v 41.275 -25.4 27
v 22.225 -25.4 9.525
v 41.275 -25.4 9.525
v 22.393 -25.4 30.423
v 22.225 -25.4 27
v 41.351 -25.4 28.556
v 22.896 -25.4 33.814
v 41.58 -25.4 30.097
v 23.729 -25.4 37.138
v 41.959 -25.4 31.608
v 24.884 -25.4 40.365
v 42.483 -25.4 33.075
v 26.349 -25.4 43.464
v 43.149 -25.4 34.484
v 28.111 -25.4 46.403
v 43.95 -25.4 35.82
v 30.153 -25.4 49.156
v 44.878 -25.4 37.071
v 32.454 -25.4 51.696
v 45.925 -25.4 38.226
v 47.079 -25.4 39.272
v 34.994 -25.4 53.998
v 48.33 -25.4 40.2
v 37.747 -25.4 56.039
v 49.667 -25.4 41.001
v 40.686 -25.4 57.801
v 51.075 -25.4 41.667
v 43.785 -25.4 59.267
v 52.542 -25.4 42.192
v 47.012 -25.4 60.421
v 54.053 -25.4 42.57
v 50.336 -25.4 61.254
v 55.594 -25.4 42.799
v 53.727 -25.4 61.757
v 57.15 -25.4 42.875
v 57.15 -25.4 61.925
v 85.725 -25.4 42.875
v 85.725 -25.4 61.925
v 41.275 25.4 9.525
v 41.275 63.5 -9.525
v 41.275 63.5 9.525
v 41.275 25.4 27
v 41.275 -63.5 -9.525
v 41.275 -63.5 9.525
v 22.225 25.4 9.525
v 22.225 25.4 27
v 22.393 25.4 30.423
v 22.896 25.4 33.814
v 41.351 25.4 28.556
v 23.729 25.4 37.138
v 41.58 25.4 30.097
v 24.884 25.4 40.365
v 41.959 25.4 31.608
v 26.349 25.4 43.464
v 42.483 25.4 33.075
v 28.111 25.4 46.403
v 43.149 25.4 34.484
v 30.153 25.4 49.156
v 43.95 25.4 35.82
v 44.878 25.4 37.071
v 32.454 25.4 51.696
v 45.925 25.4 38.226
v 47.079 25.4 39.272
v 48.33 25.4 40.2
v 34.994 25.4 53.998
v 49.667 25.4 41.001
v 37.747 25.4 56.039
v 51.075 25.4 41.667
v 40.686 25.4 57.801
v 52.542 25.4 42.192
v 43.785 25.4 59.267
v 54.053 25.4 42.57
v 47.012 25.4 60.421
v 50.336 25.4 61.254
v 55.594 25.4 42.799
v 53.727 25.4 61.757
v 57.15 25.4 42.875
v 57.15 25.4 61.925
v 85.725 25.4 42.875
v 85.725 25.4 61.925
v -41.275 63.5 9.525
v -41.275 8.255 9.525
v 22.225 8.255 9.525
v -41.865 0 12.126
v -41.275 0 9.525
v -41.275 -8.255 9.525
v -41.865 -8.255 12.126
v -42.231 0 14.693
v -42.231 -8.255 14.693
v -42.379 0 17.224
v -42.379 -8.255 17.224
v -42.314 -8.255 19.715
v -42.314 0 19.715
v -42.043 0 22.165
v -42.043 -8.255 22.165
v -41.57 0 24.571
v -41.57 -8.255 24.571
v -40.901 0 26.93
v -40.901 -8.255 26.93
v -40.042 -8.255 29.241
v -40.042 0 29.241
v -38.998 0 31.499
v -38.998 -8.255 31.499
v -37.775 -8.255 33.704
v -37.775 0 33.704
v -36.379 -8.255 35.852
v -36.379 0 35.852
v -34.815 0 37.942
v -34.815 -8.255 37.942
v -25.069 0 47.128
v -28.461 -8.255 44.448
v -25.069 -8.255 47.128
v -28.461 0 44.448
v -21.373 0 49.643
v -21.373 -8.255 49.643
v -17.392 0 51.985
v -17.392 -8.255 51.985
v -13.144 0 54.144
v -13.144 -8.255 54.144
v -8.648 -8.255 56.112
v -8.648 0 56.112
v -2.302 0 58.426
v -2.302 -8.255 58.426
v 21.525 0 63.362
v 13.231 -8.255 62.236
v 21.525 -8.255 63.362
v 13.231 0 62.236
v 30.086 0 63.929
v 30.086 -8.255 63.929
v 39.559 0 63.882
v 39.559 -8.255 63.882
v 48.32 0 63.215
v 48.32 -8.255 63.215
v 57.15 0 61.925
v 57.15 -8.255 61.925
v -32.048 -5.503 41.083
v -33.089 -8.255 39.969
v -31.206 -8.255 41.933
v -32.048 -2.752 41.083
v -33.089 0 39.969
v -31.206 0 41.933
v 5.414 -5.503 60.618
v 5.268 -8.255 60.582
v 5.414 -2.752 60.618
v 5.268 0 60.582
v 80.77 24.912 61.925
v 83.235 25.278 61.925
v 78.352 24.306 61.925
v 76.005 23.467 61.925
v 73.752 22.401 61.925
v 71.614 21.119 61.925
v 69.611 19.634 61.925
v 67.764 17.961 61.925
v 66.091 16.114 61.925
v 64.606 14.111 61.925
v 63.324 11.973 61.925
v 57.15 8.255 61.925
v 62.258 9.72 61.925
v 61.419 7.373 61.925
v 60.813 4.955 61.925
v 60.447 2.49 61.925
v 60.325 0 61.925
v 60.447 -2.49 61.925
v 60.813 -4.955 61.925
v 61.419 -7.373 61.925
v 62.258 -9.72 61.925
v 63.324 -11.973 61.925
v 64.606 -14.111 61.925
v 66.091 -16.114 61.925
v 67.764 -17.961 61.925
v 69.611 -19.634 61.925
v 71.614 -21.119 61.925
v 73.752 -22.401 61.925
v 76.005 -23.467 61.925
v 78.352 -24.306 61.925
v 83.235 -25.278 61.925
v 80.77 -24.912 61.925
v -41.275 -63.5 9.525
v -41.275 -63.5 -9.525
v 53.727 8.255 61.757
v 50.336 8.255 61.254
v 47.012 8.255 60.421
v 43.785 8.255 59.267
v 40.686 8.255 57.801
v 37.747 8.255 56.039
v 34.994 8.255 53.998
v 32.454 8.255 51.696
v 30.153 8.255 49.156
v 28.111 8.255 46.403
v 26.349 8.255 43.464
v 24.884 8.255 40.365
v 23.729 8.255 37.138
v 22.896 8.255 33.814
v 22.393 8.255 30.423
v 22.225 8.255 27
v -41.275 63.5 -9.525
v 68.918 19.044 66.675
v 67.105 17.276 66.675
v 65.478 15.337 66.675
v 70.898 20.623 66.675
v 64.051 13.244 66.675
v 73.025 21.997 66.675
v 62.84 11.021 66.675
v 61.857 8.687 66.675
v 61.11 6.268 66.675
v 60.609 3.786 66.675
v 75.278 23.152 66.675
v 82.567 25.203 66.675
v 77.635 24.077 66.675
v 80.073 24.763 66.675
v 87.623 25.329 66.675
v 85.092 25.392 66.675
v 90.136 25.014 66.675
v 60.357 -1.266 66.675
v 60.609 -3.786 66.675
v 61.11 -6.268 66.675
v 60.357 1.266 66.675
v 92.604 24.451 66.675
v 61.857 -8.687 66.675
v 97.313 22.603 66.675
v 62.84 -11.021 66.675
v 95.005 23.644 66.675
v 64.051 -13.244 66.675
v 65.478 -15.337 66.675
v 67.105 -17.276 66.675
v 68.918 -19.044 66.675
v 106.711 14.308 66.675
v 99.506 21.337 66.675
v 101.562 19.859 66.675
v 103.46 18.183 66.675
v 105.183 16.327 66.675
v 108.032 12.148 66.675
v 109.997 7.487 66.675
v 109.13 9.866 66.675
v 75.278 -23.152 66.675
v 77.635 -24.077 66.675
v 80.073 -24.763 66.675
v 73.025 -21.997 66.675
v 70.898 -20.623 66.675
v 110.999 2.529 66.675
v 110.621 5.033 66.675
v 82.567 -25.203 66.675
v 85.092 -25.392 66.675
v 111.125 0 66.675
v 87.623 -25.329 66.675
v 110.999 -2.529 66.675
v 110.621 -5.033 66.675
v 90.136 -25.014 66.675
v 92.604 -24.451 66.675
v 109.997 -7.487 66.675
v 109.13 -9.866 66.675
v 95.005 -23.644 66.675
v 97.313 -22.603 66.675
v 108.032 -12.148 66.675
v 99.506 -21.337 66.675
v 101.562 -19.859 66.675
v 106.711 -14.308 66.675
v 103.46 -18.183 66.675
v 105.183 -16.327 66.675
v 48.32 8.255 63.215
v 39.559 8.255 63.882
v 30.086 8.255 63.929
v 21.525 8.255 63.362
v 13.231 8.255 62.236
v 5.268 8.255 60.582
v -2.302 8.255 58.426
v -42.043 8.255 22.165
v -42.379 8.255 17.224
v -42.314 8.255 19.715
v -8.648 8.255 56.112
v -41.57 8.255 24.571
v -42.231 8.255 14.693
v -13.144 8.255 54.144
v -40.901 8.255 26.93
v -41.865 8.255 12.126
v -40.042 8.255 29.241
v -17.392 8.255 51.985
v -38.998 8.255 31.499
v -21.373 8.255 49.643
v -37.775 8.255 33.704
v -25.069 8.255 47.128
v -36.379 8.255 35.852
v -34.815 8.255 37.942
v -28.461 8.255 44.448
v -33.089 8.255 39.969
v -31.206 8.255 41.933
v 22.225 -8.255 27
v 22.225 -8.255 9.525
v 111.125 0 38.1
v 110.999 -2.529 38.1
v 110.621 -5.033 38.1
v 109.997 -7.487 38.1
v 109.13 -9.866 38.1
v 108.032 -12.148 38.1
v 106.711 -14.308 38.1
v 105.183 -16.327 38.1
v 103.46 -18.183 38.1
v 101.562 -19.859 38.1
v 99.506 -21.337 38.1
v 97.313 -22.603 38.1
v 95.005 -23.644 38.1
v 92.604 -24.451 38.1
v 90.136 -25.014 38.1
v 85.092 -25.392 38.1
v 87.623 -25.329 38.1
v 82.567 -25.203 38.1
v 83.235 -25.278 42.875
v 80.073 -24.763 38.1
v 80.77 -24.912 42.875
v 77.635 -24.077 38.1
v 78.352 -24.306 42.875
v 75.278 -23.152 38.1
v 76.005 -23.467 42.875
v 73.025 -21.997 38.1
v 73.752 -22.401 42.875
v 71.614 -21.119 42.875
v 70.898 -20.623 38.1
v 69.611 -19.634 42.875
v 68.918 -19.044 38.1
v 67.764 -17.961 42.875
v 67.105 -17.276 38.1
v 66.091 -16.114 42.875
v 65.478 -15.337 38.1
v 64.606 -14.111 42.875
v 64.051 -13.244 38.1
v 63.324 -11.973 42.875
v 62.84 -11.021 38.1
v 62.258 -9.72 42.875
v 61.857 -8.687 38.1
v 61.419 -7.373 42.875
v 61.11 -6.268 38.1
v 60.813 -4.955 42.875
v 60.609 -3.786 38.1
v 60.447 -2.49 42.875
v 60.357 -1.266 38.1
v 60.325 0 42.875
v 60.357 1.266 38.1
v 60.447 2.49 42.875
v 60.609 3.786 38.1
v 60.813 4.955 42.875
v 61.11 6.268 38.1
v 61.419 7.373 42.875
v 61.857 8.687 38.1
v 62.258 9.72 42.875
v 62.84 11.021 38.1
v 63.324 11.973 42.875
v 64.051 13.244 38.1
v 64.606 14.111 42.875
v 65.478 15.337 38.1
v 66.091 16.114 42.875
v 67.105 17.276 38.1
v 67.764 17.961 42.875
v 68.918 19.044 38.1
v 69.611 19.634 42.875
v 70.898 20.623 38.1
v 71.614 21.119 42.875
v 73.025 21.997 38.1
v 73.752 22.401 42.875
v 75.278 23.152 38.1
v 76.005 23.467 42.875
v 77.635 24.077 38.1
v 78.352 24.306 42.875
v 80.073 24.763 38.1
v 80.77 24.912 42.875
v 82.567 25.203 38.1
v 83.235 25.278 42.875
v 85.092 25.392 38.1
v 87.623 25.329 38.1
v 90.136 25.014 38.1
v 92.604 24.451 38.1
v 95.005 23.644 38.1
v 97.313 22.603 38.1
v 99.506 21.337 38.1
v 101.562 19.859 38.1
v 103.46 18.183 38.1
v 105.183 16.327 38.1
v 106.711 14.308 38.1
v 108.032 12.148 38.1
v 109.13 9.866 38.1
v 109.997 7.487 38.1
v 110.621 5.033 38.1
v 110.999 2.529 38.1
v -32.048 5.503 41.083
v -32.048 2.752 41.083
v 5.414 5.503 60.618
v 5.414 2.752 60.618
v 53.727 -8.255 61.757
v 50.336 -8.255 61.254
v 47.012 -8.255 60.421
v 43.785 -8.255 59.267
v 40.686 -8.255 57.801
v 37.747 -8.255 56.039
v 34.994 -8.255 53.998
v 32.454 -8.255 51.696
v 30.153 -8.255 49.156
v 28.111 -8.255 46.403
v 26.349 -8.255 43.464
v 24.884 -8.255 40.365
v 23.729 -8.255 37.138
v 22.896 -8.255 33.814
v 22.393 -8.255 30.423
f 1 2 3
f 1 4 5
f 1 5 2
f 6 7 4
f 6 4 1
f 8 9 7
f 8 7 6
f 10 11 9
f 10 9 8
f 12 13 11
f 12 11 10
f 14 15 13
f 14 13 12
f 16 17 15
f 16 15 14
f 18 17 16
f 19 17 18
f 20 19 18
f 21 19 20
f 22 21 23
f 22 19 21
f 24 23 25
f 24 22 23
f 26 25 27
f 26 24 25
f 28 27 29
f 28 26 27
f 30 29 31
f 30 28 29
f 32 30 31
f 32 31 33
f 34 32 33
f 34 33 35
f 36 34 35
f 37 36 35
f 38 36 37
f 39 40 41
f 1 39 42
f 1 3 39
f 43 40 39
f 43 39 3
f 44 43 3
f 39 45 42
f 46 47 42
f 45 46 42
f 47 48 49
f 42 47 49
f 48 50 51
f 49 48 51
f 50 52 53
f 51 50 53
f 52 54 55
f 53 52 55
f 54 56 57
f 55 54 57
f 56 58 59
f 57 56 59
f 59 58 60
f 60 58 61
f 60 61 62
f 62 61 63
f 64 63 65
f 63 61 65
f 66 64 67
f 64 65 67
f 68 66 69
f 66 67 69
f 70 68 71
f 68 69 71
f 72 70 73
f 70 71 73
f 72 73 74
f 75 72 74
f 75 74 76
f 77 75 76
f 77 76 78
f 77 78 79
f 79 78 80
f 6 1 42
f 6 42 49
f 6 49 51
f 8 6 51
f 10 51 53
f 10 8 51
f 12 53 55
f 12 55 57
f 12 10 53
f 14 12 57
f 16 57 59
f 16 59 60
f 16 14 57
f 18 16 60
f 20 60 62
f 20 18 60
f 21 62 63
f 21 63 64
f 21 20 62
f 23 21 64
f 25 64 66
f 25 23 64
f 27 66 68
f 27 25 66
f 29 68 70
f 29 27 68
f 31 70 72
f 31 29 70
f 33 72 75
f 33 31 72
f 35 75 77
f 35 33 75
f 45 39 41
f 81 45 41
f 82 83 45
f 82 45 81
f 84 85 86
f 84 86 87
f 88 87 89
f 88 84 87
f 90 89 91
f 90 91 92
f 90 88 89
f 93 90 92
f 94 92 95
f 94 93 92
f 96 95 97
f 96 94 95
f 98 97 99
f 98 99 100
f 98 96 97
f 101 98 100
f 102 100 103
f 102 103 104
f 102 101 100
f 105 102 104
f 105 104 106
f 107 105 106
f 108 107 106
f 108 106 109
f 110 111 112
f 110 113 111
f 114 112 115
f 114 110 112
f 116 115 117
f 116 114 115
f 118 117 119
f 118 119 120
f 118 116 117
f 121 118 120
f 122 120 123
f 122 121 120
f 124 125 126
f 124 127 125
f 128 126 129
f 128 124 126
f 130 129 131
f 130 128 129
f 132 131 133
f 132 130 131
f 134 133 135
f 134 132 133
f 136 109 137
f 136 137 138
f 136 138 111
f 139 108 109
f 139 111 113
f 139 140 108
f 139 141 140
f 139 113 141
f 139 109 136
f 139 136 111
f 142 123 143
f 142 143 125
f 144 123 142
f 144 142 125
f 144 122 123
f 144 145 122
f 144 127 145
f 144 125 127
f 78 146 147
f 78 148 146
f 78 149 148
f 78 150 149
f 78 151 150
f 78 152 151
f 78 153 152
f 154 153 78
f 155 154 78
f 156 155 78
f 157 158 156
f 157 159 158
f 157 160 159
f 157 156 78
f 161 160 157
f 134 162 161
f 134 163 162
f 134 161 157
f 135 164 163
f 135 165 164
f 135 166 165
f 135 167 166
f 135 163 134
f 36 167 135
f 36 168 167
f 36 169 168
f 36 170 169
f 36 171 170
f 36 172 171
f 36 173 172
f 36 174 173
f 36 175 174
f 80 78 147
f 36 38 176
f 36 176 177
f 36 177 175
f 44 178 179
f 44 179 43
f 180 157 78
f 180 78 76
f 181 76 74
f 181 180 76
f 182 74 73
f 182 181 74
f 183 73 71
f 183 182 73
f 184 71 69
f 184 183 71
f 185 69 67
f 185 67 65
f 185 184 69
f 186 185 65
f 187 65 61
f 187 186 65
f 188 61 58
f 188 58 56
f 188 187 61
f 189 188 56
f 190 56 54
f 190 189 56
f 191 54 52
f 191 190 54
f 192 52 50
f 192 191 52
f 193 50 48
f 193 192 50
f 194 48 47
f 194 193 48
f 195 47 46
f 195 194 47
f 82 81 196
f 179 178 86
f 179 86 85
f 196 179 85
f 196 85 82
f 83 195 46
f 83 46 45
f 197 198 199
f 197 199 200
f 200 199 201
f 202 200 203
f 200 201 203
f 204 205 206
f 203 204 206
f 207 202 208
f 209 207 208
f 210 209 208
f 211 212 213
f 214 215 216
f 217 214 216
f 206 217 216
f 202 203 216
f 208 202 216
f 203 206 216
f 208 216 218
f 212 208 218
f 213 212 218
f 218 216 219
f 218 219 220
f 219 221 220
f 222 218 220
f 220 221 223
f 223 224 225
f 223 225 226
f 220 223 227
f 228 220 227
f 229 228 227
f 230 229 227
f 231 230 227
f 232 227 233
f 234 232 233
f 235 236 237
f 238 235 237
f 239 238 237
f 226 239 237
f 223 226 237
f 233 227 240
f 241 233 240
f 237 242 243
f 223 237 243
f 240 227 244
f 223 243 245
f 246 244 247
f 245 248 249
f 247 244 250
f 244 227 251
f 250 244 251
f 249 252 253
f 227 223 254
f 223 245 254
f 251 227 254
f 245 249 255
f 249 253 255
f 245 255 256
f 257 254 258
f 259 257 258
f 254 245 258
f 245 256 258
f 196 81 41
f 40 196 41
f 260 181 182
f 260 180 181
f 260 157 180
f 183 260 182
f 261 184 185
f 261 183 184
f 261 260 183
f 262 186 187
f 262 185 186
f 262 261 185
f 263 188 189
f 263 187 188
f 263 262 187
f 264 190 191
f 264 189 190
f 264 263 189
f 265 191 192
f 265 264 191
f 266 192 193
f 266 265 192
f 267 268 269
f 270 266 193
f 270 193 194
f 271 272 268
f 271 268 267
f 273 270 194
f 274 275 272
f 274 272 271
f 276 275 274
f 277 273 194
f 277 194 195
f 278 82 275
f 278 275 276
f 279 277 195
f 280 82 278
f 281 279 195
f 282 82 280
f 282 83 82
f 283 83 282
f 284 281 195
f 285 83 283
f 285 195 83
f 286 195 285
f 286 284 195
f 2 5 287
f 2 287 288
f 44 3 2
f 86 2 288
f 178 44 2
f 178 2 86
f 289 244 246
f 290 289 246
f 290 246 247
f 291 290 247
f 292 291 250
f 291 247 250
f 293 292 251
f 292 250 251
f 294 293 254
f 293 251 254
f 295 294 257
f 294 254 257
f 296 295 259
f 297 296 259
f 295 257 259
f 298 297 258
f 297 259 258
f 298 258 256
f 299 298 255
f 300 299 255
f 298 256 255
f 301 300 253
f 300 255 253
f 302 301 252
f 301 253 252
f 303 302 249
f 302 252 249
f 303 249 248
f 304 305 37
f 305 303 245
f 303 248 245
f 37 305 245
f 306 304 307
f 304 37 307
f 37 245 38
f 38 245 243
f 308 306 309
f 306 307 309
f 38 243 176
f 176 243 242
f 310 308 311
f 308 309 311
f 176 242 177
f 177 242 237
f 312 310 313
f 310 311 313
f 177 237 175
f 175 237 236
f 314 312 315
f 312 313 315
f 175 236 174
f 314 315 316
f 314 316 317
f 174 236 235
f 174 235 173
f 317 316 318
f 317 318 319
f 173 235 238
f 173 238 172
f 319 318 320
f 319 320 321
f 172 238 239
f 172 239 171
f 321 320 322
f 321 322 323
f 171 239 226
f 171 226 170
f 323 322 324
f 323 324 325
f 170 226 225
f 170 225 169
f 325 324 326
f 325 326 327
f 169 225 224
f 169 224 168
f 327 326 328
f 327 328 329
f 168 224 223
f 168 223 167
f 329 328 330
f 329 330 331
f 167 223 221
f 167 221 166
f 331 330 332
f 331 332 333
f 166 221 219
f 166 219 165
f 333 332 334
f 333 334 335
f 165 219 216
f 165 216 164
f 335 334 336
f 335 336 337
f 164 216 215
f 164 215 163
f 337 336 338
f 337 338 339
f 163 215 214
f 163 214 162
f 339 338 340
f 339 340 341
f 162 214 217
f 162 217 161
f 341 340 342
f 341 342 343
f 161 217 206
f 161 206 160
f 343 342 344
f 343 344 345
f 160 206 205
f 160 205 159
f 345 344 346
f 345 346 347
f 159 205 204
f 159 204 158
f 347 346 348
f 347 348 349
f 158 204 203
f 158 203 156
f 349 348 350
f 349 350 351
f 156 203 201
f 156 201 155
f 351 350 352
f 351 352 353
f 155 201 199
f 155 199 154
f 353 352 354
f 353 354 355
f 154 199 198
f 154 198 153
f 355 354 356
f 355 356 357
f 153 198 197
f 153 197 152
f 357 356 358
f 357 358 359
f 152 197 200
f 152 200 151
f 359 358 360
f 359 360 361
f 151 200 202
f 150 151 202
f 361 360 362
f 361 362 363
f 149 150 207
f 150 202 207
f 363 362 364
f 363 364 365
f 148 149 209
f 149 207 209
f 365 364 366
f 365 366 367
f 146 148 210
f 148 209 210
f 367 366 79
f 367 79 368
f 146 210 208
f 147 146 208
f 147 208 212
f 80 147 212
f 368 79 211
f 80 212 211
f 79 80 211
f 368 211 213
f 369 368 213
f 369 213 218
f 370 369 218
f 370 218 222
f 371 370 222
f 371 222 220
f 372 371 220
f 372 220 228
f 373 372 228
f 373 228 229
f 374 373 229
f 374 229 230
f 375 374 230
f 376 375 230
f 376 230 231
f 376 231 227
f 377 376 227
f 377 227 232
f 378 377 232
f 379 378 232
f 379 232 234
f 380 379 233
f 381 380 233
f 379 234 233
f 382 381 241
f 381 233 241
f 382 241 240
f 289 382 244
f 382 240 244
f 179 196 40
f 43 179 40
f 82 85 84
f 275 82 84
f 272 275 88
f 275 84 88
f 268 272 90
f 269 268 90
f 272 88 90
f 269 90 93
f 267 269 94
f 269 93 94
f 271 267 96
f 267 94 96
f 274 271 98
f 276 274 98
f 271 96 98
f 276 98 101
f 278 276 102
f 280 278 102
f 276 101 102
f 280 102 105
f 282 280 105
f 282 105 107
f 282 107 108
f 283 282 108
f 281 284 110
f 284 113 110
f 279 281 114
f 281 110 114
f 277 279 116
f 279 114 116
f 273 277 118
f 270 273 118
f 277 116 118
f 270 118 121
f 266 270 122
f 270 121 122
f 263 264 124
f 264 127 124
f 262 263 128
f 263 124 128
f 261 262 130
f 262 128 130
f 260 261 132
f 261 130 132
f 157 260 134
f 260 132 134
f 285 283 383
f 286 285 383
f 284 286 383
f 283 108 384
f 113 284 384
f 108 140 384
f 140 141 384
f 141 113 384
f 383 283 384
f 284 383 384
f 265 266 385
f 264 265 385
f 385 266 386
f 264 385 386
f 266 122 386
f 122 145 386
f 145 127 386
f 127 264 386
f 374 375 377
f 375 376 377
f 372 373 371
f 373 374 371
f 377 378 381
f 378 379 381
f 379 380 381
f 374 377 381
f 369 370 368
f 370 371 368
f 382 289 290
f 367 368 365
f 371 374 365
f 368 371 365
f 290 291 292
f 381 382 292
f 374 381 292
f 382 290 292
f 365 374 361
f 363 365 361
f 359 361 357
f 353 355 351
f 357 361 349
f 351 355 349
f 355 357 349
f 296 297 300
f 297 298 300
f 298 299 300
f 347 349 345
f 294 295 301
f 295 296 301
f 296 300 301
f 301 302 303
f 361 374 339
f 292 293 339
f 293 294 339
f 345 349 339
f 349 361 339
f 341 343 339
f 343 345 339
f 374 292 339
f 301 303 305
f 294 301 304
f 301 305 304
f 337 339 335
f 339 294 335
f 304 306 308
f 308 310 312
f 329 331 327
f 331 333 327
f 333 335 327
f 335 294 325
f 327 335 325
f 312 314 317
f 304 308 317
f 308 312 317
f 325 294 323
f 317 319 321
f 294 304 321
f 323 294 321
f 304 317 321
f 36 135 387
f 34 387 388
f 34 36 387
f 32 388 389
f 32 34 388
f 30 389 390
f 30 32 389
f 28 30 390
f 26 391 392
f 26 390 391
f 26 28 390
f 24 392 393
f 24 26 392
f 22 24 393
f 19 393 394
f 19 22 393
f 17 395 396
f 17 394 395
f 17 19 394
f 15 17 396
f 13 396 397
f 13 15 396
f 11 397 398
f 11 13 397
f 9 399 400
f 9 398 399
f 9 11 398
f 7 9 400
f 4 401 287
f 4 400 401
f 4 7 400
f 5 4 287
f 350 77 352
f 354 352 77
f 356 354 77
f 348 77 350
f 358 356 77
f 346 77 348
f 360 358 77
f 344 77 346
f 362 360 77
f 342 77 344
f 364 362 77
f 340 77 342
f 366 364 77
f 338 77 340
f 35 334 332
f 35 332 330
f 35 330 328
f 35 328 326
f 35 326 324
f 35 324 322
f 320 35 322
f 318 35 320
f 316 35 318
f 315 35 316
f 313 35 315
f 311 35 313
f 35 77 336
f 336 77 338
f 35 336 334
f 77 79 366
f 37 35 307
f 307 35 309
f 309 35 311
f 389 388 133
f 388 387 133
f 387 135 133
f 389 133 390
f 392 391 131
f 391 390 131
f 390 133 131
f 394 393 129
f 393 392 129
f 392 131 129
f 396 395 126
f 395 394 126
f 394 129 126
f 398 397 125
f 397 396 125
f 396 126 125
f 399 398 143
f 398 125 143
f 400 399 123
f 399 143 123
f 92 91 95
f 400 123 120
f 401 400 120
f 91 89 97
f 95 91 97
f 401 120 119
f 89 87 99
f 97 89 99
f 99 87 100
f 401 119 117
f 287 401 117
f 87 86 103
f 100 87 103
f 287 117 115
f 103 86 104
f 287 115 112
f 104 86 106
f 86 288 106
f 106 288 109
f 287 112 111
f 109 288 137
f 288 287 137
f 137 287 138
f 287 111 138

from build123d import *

# Parameters (mm, degrees)
F1_DEPTH = 63.5
F0_W     = 25.4
F0_H     = 19.05
F2_DEPTH = 25.4
F3_DEPTH = 8.255


with BuildPart() as f1:
    # F0 (on Front) → F1 (new body, symmetric)
    with BuildSketch(Plane.XZ):
        Polygon((-41.275, 9.525), (-41.275, -9.525), (41.275, -9.525), (41.275, 9.525), (22.225, 9.525), align=None)
    extrude(amount=F1_DEPTH, both=True)

    # F0 (on Front) → F2 (join, symmetric)
    with BuildSketch(Plane.XZ):
        with BuildLine():
            Line((22.225, 9.525), (41.275, 9.525))
            Line((41.275, 9.525), (41.275, 27.0002))
            ThreePointArc((41.275, 27.0002), (45.9246798487, 38.2255201513), (57.15, 42.8752))
            Line((57.15, 42.8752), (60.325, 42.8752))
            Line((60.325, 42.8752), (60.325, 61.9252))
            Line((60.325, 61.9252), (57.15, 61.9252))
            ThreePointArc((57.15, 61.9252), (32.4542956671, 51.6959043329), (22.225, 27.0002))
            Line((22.225, 27.0002), (22.225, 9.525))
        make_face()
        with Locations((73.025, 52.4002)):
            Rectangle(F0_W, F0_H)
    extrude(amount=F2_DEPTH, both=True)

    # F0 (on Front) → F3 (join, symmetric)
    with BuildSketch(Plane.XZ):
        with BuildLine():
            add(Edge.make_bspline(
                [(-41.275, 9.525), (-50.8186854422, 45.0256727636), (2.9303120675, 71.7999846045), (57.15, 61.9252)],
                knots=[0, 0, 0, 0, 111.5045361635, 111.5045361635, 111.5045361635, 111.5045361635], degree=3))
            Line((-41.275, 9.525), (22.225, 9.525))
            Line((22.225, 9.525), (22.225, 27.0002))
            ThreePointArc((22.225, 27.0002), (32.4542956671, 51.6959043329), (57.15, 61.9252))
        make_face()
    extrude(amount=F3_DEPTH, both=True)

    # F0 (on Front) → F4 (revolve)
    with BuildSketch(Plane.XZ):
        Polygon((85.725, 66.675), (85.725, 61.9252), (85.725, 42.8752), (85.725, 38.1), (111.125, 38.1), (111.125, 66.675), align=None)
    revolve(axis=Axis((85.725, 0, 52.3875), (0, 0, -1)))


solid = f1.part
